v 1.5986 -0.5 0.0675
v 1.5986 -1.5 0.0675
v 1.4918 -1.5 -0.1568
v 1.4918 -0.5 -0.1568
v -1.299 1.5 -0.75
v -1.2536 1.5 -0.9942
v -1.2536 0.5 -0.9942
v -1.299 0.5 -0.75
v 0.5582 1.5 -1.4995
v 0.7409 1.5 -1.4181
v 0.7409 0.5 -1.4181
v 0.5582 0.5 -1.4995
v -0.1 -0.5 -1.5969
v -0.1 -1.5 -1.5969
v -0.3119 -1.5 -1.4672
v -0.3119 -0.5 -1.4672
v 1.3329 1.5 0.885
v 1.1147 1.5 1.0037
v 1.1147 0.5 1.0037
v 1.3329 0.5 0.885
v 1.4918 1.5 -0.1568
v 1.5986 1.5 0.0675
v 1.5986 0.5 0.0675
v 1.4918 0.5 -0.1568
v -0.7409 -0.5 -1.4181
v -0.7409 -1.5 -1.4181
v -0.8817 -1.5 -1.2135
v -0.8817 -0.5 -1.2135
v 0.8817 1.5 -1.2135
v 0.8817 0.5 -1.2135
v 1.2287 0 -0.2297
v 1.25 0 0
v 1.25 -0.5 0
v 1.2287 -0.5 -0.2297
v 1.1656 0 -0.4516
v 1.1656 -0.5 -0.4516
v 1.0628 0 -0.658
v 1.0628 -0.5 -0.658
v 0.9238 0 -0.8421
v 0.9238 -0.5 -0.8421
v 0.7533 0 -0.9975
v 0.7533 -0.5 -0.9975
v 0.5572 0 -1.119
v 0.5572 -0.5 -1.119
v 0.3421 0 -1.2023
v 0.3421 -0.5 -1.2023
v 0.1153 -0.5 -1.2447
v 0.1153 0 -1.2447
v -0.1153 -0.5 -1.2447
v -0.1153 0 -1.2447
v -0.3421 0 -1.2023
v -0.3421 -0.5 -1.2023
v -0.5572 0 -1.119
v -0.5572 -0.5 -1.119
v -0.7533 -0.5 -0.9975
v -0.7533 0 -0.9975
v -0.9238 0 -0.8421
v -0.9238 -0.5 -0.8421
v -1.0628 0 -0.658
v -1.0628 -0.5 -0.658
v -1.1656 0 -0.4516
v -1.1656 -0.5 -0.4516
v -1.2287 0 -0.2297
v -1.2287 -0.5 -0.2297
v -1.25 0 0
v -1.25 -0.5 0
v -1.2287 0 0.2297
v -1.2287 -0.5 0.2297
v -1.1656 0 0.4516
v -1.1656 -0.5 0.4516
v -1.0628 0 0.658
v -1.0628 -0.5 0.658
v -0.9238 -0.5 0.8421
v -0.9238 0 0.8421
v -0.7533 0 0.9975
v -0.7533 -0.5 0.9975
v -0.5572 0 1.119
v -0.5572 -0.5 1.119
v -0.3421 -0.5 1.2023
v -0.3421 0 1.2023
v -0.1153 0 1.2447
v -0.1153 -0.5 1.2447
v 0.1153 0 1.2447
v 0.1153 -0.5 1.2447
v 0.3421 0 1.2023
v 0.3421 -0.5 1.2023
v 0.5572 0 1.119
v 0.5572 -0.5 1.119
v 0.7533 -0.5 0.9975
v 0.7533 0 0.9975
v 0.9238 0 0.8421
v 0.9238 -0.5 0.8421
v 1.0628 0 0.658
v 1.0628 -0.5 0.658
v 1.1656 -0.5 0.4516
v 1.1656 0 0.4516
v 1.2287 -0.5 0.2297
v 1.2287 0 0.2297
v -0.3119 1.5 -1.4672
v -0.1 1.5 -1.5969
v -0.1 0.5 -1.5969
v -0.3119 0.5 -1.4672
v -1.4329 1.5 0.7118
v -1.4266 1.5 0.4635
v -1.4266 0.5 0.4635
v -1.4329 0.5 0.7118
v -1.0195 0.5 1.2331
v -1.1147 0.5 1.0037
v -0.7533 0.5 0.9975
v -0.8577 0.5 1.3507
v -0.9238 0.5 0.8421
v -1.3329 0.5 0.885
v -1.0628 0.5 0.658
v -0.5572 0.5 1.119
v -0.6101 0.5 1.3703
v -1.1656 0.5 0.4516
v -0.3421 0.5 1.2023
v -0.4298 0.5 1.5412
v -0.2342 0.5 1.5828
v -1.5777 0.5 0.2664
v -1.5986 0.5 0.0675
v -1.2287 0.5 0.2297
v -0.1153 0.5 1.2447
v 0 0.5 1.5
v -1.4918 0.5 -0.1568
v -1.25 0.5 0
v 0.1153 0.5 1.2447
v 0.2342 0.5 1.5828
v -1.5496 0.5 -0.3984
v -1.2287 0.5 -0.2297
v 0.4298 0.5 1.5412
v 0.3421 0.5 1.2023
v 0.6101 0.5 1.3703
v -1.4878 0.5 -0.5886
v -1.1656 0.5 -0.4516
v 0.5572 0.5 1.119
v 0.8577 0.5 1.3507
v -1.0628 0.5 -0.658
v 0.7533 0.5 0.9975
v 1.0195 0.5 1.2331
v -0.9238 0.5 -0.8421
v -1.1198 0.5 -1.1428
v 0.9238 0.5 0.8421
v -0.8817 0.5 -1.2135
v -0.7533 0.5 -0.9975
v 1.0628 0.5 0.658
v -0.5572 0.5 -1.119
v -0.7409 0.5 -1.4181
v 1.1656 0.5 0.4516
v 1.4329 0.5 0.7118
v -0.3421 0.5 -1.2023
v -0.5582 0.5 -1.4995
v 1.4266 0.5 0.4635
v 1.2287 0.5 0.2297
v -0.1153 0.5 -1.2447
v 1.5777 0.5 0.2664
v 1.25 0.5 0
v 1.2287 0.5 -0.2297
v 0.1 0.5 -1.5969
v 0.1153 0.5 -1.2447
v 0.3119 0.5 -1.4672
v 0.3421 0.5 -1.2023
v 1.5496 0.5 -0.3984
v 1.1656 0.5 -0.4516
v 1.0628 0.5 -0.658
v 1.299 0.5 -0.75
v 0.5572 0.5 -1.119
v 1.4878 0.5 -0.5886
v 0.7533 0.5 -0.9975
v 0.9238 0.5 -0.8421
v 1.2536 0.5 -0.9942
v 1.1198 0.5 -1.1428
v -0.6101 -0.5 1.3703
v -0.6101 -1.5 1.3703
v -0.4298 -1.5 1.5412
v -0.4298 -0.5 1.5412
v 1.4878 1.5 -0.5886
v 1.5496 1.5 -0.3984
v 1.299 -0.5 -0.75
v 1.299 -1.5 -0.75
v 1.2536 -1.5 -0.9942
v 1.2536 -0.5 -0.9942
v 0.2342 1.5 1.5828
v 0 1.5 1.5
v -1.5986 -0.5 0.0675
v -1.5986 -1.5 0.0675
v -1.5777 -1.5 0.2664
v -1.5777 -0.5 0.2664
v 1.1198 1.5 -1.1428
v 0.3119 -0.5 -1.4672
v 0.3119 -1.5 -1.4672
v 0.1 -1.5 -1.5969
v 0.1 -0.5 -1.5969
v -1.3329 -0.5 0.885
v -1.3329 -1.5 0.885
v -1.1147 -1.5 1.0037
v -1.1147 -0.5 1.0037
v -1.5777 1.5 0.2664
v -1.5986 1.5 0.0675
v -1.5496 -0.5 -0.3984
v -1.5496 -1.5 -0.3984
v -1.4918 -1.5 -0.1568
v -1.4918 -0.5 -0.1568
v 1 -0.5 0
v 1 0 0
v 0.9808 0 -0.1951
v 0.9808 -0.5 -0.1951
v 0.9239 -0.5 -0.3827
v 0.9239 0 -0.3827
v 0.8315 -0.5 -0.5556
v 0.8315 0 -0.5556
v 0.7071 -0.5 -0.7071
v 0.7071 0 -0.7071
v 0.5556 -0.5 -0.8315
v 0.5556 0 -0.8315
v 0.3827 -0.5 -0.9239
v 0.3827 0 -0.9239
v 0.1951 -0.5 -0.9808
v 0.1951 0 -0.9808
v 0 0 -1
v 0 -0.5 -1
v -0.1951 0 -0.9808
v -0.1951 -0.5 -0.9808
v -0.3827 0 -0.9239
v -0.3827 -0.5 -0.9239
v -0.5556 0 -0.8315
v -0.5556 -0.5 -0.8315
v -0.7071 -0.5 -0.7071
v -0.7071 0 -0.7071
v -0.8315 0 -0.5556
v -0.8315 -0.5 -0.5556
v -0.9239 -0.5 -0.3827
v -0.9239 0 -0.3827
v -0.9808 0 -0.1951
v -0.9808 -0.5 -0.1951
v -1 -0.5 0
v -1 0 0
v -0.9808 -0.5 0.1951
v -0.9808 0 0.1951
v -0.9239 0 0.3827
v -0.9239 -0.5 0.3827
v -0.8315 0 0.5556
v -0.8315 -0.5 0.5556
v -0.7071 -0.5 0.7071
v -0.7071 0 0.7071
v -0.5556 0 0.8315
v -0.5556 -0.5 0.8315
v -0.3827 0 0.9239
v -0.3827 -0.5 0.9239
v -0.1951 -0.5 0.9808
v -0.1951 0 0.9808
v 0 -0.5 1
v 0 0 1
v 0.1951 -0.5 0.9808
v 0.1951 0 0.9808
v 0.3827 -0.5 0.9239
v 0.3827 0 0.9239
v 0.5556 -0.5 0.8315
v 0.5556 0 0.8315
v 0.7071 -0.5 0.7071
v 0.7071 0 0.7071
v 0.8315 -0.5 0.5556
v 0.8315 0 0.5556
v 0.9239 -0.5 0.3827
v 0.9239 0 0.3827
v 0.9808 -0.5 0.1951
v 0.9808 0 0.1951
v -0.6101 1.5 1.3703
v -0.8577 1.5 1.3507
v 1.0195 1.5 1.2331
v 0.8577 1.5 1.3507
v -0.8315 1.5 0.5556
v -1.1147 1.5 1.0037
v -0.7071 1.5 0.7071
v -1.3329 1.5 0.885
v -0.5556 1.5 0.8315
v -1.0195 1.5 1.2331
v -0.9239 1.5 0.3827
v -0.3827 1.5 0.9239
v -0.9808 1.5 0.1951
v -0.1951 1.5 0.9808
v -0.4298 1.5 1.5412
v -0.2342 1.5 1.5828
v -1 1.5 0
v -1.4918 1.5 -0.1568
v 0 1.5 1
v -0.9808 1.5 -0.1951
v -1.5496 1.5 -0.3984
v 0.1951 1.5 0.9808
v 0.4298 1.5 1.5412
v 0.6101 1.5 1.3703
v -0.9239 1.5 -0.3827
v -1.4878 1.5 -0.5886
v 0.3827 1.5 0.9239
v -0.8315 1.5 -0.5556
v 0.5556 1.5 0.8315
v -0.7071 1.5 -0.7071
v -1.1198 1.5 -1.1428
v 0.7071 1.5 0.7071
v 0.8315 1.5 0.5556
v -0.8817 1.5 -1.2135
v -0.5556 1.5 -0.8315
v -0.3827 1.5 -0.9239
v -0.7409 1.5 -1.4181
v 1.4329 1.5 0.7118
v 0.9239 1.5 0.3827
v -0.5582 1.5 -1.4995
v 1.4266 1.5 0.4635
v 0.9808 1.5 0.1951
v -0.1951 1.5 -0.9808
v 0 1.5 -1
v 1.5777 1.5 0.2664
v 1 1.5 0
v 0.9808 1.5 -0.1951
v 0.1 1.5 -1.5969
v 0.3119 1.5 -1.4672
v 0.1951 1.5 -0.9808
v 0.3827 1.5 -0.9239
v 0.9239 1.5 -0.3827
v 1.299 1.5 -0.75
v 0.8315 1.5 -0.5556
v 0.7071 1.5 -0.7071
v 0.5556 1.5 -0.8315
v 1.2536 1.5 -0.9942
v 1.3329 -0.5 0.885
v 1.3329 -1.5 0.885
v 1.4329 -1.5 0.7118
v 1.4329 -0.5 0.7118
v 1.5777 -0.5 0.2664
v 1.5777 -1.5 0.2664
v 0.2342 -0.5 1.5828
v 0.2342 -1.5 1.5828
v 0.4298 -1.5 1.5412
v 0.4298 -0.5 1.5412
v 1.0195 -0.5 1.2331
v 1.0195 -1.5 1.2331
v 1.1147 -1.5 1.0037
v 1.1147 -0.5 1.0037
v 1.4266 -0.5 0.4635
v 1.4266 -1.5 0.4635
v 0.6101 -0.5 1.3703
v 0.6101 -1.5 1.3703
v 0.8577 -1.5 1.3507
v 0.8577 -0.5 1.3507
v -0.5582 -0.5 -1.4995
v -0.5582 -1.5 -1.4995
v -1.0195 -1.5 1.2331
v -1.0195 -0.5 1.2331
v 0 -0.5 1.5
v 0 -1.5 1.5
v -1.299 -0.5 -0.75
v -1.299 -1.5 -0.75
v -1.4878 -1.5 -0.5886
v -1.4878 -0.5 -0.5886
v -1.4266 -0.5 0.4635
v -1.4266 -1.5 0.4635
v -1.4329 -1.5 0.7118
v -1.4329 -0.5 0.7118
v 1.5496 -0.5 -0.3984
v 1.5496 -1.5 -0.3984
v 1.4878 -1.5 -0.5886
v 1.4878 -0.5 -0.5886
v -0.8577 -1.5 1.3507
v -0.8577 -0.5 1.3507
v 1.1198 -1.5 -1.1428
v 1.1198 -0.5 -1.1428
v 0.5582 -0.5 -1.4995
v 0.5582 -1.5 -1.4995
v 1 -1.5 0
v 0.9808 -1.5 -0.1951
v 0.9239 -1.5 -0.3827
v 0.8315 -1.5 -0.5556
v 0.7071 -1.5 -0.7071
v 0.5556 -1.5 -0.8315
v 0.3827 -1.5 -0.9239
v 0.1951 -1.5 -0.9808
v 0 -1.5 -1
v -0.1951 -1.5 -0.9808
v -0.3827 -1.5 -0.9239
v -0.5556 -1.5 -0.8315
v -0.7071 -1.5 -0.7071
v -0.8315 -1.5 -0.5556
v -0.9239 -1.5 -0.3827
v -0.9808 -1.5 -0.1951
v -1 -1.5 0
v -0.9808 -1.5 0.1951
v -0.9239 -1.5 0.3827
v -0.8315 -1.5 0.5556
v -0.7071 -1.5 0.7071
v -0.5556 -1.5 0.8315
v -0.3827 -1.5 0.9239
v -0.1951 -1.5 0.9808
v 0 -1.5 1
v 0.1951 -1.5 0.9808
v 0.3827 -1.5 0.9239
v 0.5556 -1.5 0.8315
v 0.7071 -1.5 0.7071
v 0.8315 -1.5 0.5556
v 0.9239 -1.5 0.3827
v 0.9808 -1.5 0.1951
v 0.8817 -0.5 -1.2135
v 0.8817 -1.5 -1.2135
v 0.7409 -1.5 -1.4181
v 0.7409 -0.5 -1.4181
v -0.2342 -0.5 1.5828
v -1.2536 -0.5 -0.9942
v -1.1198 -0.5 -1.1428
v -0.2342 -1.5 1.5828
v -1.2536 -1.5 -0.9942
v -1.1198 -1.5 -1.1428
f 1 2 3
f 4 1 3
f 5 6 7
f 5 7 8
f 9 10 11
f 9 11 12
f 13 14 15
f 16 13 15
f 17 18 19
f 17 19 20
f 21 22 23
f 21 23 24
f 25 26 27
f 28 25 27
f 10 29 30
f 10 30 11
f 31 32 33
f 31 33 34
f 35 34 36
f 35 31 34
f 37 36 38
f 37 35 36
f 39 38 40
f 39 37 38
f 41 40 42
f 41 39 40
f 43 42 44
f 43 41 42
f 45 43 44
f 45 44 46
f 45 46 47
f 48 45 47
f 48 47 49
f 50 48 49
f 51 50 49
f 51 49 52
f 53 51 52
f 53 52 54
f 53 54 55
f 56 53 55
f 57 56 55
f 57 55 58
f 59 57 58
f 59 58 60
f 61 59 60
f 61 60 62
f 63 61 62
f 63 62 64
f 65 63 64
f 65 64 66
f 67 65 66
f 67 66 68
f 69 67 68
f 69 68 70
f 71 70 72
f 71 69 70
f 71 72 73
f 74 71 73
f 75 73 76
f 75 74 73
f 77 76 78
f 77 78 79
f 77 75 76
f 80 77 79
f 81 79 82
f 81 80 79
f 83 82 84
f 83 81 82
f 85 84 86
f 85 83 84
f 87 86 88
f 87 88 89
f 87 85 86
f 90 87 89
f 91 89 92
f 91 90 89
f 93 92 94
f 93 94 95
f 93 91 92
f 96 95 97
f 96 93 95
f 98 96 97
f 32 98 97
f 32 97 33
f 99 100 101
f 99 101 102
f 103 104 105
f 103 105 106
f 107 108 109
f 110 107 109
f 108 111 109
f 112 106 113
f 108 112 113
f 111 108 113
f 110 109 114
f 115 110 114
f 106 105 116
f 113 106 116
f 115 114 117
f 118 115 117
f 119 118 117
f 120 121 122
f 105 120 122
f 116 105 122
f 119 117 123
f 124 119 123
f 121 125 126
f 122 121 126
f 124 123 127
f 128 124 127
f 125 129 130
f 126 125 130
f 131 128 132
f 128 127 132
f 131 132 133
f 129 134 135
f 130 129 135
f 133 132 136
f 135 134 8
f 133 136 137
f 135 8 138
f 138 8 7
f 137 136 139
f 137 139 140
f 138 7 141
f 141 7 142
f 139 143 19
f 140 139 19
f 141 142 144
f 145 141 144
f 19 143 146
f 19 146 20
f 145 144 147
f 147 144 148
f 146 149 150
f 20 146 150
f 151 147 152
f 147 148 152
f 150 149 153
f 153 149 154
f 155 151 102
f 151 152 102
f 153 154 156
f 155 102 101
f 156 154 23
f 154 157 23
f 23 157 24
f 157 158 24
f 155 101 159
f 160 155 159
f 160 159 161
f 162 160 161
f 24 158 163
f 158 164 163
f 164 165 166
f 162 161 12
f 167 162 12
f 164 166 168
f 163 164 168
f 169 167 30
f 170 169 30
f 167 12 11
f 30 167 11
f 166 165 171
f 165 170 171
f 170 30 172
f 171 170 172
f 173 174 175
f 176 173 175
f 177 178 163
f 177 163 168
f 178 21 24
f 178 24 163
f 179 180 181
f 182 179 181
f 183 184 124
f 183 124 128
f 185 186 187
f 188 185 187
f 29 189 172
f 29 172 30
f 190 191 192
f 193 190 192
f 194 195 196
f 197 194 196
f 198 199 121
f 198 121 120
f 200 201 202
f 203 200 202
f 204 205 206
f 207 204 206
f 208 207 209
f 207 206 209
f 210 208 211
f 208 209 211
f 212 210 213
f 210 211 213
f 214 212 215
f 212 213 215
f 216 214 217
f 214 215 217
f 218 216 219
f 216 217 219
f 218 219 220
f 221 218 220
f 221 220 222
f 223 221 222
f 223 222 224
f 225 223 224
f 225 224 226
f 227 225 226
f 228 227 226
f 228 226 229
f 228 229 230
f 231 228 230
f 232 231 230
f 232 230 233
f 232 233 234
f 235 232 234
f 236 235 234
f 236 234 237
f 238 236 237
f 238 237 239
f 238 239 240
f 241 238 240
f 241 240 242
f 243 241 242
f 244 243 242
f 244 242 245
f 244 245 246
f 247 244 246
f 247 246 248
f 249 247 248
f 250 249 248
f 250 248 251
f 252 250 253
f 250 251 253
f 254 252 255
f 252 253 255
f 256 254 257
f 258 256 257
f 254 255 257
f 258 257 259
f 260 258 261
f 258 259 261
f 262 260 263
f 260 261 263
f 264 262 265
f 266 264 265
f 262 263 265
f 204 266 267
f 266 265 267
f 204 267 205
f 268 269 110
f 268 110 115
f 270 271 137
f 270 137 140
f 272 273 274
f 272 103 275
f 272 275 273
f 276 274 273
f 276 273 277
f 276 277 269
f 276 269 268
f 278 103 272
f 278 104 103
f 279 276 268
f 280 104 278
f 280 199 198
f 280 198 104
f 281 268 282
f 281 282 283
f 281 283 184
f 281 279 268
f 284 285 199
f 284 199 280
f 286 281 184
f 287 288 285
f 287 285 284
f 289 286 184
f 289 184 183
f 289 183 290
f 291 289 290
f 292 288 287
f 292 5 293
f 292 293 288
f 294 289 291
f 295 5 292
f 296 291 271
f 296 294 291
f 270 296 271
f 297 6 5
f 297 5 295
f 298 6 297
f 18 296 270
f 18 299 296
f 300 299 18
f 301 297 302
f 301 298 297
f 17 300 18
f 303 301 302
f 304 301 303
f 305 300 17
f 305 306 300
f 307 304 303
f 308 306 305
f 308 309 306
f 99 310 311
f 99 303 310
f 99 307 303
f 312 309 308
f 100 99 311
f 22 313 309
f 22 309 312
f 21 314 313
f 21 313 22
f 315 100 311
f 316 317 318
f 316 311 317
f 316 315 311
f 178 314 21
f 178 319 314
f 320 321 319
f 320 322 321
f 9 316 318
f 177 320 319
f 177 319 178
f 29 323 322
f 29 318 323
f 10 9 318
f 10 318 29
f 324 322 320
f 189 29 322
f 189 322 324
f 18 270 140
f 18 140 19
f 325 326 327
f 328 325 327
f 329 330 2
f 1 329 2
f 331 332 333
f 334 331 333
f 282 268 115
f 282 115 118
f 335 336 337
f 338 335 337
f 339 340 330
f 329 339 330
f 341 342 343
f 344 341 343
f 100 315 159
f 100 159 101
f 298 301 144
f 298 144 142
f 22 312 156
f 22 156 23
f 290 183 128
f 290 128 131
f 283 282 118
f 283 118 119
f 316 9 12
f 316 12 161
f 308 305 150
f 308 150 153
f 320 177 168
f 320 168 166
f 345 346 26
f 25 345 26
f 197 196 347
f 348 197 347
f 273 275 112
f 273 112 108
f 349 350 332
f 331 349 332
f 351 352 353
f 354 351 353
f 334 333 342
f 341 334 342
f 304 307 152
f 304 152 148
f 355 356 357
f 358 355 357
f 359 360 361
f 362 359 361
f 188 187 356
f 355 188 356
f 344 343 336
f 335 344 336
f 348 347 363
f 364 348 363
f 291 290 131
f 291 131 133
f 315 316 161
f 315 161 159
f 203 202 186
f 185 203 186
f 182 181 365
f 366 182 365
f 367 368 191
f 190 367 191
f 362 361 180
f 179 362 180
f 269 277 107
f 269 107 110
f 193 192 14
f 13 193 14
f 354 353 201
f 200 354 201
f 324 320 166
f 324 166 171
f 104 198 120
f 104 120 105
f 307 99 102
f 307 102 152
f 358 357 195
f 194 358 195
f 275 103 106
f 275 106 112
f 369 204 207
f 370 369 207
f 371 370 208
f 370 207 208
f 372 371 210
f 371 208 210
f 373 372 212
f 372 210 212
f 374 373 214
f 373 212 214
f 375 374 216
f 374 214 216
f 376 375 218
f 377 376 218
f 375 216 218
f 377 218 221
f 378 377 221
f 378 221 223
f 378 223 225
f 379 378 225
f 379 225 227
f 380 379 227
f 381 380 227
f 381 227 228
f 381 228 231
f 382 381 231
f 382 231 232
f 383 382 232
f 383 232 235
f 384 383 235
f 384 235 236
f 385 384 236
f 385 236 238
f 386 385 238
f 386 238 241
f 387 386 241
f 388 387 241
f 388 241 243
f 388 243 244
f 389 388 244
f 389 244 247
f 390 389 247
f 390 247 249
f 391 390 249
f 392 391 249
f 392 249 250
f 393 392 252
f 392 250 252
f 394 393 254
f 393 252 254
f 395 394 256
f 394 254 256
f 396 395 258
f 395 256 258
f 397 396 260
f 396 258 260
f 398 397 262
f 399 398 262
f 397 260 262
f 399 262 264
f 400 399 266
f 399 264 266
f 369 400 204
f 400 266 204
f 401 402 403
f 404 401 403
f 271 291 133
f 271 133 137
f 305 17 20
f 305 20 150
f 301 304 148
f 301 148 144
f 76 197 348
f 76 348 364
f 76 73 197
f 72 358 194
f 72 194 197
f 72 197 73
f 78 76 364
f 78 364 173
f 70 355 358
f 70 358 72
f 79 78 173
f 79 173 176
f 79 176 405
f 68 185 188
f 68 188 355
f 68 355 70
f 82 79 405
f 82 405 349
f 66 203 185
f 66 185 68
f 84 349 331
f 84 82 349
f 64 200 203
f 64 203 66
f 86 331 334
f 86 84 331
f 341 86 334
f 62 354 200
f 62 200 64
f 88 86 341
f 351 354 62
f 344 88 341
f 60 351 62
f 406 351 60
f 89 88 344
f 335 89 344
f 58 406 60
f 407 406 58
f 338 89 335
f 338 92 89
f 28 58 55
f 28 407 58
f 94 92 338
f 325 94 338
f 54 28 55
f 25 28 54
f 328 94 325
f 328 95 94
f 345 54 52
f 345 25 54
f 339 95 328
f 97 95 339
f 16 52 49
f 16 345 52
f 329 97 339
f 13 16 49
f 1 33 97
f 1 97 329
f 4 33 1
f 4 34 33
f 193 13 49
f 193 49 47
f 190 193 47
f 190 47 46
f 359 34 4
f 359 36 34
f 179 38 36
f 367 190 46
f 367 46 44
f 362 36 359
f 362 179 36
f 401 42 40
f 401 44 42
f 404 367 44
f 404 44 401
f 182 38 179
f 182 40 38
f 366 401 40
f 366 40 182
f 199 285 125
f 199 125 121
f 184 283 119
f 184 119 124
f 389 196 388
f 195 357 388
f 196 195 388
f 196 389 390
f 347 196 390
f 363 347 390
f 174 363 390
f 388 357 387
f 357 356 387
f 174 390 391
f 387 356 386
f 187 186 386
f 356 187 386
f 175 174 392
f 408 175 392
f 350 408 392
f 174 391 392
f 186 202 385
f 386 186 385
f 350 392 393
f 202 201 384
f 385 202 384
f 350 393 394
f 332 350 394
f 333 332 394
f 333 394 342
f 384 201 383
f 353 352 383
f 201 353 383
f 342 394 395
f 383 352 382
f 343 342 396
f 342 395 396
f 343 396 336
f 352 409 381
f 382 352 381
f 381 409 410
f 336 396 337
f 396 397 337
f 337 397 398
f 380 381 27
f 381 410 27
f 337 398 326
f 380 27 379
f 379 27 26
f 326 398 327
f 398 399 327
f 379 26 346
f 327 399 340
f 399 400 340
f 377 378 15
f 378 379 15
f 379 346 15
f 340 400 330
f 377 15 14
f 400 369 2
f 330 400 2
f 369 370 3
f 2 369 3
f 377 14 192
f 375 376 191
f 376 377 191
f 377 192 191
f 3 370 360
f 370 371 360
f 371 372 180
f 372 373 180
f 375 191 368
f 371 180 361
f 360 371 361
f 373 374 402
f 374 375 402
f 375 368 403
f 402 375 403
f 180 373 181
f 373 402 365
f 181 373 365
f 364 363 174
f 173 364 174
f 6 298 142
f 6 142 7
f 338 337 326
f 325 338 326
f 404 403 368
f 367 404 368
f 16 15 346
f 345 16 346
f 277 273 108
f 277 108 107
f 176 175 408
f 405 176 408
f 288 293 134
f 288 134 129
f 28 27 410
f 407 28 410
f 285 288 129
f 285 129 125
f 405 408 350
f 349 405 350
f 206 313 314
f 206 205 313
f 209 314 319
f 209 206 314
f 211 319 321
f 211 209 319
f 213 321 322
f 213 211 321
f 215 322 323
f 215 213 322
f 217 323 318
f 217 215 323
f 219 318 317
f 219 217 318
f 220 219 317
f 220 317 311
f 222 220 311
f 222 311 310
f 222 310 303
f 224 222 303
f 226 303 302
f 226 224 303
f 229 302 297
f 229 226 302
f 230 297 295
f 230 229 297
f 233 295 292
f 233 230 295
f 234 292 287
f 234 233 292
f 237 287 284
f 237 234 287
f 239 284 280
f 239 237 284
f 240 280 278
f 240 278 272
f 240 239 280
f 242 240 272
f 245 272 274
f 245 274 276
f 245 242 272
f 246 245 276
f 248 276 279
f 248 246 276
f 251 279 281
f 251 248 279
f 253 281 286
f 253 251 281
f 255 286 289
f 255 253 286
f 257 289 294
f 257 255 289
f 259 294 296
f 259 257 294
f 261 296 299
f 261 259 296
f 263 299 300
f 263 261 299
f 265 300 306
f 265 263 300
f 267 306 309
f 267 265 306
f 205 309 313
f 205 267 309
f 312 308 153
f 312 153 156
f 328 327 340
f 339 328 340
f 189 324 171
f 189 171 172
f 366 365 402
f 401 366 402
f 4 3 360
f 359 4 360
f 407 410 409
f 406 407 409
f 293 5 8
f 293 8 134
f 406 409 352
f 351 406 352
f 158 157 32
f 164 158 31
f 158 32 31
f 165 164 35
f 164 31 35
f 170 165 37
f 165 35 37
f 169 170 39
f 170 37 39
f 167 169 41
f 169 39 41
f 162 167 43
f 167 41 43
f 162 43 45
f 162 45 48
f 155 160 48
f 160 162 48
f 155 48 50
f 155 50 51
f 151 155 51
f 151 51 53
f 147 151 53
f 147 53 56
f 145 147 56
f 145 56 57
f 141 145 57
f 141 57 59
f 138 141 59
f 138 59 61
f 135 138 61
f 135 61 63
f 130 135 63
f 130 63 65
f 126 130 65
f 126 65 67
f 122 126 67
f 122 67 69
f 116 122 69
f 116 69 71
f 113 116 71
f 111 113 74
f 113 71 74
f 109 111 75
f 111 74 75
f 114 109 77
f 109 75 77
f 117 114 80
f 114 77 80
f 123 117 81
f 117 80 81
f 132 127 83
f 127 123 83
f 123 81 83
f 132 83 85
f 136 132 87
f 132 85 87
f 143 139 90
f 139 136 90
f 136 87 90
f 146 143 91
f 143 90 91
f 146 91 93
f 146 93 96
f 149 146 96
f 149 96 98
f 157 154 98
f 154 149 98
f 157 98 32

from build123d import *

# Parameters (mm, degrees)
SKETCH1_R           = 1.25
SKETCH1_R_2         = 1
BOSS_EXTRUDE1_DEPTH = 1.5
SKETCH2_R           = 1
BOSS_EXTRUDE2_DEPTH = 1


with BuildPart() as part:
    # Sketch1 → Boss-Extrude1 (new body)
    with BuildSketch(Plane(origin=(0, 0, 0), x_dir=(1, 0, 0), z_dir=(0, 1, 0))):
        Circle(SKETCH1_R)
        Circle(SKETCH1_R_2, mode=Mode.SUBTRACT)
    boss_extrude1 = extrude(amount=BOSS_EXTRUDE1_DEPTH)

    # Sketch2 → Boss-Extrude2 (add)
    with BuildSketch(Plane(origin=(0, 1.5, 0), x_dir=(1, 0, 0), z_dir=(0, 1, 0))):
        Polygon((-0.740860879, 1.418141445), (-0.881677878, 1.213525492), (-1.11979406, 1.142830374), (-1.253620181, 0.994201408), (-1.299038106, 0.75), (-1.487813767, 0.58856622), (-1.549617166, 0.398354916), (-1.491782843, 0.156792695), (-1.598576957, -0.067466381), (-1.577671264, -0.26637076), (-1.426584774, -0.463525492), (-1.432931669, -0.711833431), (-1.332931669, -0.885038512), (-1.114717238, -1.00369591), (-1.019519477, -1.233118014), (-0.857716078, -1.350675064), (-0.610104965, -1.370318186), (-0.429823106, -1.54118529), (-0.234193585, -1.582767628), (0, -1.5), (0.234193585, -1.582767628), (0.429823106, -1.54118529), (0.610104965, -1.370318186), (0.857716078, -1.350675064), (1.019519477, -1.233118014), (1.114717238, -1.00369591), (1.332931669, -0.885038512), (1.432931669, -0.711833431), (1.426584774, -0.463525492), (1.577671264, -0.26637076), (1.598576957, -0.067466381), (1.491782843, 0.156792695), (1.549617166, 0.398354916), (1.487813767, 0.58856622), (1.299038106, 0.75), (1.253620181, 0.994201408), (1.11979406, 1.142830374), (0.881677878, 1.213525492), (0.740860879, 1.418141445), (0.558151787, 1.499488774), (0.311867536, 1.467221401), (0.1, 1.596871942), (-0.1, 1.596871942), (-0.311867536, 1.467221401), (-0.558151787, 1.499488774), align=None)
        Circle(SKETCH2_R, mode=Mode.SUBTRACT)
    boss_extrude2 = extrude(amount=-BOSS_EXTRUDE2_DEPTH)

    # Mirror1: Boss-Extrude1, Boss-Extrude2 across plane
    add(boss_extrude1.mirror(Plane.ZX))
    add(boss_extrude2.mirror(Plane.ZX))


solid = part.part
